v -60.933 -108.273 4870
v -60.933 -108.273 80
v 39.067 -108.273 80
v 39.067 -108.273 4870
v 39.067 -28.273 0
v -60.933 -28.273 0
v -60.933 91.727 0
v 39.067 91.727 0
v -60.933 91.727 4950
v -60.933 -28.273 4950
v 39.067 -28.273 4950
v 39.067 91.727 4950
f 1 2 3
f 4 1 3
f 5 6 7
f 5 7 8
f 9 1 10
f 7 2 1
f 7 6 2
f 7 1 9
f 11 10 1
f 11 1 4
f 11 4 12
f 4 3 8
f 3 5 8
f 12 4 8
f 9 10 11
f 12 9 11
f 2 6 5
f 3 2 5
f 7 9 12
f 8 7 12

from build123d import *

# Parameters (mm, degrees)
F0_W     = 100
F0_H     = 200
F1_DEPTH = 4950
F2_SIZE  = 80
F3_SIZE  = 80


with BuildPart() as f1:
    # F0 (on Top) → F1 (new body)
    with BuildSketch(Plane.XY):
        with Locations((-10.933057, -8.272938)):
            Rectangle(F0_W, F0_H)
    extrude(amount=F1_DEPTH)

    # F2
    f2_edges = [f1.edges().sort_by_distance(p)[0] for p in [
        (-10.933057, -108.272938, 4950),
    ]]
    chamfer(f2_edges, length=F2_SIZE)

    # F3
    f3_edges = [f1.edges().sort_by_distance(p)[0] for p in [
        (-10.933057, -108.272938, 0),
    ]]
    chamfer(f3_edges, length=F3_SIZE)


solid = f1.part
